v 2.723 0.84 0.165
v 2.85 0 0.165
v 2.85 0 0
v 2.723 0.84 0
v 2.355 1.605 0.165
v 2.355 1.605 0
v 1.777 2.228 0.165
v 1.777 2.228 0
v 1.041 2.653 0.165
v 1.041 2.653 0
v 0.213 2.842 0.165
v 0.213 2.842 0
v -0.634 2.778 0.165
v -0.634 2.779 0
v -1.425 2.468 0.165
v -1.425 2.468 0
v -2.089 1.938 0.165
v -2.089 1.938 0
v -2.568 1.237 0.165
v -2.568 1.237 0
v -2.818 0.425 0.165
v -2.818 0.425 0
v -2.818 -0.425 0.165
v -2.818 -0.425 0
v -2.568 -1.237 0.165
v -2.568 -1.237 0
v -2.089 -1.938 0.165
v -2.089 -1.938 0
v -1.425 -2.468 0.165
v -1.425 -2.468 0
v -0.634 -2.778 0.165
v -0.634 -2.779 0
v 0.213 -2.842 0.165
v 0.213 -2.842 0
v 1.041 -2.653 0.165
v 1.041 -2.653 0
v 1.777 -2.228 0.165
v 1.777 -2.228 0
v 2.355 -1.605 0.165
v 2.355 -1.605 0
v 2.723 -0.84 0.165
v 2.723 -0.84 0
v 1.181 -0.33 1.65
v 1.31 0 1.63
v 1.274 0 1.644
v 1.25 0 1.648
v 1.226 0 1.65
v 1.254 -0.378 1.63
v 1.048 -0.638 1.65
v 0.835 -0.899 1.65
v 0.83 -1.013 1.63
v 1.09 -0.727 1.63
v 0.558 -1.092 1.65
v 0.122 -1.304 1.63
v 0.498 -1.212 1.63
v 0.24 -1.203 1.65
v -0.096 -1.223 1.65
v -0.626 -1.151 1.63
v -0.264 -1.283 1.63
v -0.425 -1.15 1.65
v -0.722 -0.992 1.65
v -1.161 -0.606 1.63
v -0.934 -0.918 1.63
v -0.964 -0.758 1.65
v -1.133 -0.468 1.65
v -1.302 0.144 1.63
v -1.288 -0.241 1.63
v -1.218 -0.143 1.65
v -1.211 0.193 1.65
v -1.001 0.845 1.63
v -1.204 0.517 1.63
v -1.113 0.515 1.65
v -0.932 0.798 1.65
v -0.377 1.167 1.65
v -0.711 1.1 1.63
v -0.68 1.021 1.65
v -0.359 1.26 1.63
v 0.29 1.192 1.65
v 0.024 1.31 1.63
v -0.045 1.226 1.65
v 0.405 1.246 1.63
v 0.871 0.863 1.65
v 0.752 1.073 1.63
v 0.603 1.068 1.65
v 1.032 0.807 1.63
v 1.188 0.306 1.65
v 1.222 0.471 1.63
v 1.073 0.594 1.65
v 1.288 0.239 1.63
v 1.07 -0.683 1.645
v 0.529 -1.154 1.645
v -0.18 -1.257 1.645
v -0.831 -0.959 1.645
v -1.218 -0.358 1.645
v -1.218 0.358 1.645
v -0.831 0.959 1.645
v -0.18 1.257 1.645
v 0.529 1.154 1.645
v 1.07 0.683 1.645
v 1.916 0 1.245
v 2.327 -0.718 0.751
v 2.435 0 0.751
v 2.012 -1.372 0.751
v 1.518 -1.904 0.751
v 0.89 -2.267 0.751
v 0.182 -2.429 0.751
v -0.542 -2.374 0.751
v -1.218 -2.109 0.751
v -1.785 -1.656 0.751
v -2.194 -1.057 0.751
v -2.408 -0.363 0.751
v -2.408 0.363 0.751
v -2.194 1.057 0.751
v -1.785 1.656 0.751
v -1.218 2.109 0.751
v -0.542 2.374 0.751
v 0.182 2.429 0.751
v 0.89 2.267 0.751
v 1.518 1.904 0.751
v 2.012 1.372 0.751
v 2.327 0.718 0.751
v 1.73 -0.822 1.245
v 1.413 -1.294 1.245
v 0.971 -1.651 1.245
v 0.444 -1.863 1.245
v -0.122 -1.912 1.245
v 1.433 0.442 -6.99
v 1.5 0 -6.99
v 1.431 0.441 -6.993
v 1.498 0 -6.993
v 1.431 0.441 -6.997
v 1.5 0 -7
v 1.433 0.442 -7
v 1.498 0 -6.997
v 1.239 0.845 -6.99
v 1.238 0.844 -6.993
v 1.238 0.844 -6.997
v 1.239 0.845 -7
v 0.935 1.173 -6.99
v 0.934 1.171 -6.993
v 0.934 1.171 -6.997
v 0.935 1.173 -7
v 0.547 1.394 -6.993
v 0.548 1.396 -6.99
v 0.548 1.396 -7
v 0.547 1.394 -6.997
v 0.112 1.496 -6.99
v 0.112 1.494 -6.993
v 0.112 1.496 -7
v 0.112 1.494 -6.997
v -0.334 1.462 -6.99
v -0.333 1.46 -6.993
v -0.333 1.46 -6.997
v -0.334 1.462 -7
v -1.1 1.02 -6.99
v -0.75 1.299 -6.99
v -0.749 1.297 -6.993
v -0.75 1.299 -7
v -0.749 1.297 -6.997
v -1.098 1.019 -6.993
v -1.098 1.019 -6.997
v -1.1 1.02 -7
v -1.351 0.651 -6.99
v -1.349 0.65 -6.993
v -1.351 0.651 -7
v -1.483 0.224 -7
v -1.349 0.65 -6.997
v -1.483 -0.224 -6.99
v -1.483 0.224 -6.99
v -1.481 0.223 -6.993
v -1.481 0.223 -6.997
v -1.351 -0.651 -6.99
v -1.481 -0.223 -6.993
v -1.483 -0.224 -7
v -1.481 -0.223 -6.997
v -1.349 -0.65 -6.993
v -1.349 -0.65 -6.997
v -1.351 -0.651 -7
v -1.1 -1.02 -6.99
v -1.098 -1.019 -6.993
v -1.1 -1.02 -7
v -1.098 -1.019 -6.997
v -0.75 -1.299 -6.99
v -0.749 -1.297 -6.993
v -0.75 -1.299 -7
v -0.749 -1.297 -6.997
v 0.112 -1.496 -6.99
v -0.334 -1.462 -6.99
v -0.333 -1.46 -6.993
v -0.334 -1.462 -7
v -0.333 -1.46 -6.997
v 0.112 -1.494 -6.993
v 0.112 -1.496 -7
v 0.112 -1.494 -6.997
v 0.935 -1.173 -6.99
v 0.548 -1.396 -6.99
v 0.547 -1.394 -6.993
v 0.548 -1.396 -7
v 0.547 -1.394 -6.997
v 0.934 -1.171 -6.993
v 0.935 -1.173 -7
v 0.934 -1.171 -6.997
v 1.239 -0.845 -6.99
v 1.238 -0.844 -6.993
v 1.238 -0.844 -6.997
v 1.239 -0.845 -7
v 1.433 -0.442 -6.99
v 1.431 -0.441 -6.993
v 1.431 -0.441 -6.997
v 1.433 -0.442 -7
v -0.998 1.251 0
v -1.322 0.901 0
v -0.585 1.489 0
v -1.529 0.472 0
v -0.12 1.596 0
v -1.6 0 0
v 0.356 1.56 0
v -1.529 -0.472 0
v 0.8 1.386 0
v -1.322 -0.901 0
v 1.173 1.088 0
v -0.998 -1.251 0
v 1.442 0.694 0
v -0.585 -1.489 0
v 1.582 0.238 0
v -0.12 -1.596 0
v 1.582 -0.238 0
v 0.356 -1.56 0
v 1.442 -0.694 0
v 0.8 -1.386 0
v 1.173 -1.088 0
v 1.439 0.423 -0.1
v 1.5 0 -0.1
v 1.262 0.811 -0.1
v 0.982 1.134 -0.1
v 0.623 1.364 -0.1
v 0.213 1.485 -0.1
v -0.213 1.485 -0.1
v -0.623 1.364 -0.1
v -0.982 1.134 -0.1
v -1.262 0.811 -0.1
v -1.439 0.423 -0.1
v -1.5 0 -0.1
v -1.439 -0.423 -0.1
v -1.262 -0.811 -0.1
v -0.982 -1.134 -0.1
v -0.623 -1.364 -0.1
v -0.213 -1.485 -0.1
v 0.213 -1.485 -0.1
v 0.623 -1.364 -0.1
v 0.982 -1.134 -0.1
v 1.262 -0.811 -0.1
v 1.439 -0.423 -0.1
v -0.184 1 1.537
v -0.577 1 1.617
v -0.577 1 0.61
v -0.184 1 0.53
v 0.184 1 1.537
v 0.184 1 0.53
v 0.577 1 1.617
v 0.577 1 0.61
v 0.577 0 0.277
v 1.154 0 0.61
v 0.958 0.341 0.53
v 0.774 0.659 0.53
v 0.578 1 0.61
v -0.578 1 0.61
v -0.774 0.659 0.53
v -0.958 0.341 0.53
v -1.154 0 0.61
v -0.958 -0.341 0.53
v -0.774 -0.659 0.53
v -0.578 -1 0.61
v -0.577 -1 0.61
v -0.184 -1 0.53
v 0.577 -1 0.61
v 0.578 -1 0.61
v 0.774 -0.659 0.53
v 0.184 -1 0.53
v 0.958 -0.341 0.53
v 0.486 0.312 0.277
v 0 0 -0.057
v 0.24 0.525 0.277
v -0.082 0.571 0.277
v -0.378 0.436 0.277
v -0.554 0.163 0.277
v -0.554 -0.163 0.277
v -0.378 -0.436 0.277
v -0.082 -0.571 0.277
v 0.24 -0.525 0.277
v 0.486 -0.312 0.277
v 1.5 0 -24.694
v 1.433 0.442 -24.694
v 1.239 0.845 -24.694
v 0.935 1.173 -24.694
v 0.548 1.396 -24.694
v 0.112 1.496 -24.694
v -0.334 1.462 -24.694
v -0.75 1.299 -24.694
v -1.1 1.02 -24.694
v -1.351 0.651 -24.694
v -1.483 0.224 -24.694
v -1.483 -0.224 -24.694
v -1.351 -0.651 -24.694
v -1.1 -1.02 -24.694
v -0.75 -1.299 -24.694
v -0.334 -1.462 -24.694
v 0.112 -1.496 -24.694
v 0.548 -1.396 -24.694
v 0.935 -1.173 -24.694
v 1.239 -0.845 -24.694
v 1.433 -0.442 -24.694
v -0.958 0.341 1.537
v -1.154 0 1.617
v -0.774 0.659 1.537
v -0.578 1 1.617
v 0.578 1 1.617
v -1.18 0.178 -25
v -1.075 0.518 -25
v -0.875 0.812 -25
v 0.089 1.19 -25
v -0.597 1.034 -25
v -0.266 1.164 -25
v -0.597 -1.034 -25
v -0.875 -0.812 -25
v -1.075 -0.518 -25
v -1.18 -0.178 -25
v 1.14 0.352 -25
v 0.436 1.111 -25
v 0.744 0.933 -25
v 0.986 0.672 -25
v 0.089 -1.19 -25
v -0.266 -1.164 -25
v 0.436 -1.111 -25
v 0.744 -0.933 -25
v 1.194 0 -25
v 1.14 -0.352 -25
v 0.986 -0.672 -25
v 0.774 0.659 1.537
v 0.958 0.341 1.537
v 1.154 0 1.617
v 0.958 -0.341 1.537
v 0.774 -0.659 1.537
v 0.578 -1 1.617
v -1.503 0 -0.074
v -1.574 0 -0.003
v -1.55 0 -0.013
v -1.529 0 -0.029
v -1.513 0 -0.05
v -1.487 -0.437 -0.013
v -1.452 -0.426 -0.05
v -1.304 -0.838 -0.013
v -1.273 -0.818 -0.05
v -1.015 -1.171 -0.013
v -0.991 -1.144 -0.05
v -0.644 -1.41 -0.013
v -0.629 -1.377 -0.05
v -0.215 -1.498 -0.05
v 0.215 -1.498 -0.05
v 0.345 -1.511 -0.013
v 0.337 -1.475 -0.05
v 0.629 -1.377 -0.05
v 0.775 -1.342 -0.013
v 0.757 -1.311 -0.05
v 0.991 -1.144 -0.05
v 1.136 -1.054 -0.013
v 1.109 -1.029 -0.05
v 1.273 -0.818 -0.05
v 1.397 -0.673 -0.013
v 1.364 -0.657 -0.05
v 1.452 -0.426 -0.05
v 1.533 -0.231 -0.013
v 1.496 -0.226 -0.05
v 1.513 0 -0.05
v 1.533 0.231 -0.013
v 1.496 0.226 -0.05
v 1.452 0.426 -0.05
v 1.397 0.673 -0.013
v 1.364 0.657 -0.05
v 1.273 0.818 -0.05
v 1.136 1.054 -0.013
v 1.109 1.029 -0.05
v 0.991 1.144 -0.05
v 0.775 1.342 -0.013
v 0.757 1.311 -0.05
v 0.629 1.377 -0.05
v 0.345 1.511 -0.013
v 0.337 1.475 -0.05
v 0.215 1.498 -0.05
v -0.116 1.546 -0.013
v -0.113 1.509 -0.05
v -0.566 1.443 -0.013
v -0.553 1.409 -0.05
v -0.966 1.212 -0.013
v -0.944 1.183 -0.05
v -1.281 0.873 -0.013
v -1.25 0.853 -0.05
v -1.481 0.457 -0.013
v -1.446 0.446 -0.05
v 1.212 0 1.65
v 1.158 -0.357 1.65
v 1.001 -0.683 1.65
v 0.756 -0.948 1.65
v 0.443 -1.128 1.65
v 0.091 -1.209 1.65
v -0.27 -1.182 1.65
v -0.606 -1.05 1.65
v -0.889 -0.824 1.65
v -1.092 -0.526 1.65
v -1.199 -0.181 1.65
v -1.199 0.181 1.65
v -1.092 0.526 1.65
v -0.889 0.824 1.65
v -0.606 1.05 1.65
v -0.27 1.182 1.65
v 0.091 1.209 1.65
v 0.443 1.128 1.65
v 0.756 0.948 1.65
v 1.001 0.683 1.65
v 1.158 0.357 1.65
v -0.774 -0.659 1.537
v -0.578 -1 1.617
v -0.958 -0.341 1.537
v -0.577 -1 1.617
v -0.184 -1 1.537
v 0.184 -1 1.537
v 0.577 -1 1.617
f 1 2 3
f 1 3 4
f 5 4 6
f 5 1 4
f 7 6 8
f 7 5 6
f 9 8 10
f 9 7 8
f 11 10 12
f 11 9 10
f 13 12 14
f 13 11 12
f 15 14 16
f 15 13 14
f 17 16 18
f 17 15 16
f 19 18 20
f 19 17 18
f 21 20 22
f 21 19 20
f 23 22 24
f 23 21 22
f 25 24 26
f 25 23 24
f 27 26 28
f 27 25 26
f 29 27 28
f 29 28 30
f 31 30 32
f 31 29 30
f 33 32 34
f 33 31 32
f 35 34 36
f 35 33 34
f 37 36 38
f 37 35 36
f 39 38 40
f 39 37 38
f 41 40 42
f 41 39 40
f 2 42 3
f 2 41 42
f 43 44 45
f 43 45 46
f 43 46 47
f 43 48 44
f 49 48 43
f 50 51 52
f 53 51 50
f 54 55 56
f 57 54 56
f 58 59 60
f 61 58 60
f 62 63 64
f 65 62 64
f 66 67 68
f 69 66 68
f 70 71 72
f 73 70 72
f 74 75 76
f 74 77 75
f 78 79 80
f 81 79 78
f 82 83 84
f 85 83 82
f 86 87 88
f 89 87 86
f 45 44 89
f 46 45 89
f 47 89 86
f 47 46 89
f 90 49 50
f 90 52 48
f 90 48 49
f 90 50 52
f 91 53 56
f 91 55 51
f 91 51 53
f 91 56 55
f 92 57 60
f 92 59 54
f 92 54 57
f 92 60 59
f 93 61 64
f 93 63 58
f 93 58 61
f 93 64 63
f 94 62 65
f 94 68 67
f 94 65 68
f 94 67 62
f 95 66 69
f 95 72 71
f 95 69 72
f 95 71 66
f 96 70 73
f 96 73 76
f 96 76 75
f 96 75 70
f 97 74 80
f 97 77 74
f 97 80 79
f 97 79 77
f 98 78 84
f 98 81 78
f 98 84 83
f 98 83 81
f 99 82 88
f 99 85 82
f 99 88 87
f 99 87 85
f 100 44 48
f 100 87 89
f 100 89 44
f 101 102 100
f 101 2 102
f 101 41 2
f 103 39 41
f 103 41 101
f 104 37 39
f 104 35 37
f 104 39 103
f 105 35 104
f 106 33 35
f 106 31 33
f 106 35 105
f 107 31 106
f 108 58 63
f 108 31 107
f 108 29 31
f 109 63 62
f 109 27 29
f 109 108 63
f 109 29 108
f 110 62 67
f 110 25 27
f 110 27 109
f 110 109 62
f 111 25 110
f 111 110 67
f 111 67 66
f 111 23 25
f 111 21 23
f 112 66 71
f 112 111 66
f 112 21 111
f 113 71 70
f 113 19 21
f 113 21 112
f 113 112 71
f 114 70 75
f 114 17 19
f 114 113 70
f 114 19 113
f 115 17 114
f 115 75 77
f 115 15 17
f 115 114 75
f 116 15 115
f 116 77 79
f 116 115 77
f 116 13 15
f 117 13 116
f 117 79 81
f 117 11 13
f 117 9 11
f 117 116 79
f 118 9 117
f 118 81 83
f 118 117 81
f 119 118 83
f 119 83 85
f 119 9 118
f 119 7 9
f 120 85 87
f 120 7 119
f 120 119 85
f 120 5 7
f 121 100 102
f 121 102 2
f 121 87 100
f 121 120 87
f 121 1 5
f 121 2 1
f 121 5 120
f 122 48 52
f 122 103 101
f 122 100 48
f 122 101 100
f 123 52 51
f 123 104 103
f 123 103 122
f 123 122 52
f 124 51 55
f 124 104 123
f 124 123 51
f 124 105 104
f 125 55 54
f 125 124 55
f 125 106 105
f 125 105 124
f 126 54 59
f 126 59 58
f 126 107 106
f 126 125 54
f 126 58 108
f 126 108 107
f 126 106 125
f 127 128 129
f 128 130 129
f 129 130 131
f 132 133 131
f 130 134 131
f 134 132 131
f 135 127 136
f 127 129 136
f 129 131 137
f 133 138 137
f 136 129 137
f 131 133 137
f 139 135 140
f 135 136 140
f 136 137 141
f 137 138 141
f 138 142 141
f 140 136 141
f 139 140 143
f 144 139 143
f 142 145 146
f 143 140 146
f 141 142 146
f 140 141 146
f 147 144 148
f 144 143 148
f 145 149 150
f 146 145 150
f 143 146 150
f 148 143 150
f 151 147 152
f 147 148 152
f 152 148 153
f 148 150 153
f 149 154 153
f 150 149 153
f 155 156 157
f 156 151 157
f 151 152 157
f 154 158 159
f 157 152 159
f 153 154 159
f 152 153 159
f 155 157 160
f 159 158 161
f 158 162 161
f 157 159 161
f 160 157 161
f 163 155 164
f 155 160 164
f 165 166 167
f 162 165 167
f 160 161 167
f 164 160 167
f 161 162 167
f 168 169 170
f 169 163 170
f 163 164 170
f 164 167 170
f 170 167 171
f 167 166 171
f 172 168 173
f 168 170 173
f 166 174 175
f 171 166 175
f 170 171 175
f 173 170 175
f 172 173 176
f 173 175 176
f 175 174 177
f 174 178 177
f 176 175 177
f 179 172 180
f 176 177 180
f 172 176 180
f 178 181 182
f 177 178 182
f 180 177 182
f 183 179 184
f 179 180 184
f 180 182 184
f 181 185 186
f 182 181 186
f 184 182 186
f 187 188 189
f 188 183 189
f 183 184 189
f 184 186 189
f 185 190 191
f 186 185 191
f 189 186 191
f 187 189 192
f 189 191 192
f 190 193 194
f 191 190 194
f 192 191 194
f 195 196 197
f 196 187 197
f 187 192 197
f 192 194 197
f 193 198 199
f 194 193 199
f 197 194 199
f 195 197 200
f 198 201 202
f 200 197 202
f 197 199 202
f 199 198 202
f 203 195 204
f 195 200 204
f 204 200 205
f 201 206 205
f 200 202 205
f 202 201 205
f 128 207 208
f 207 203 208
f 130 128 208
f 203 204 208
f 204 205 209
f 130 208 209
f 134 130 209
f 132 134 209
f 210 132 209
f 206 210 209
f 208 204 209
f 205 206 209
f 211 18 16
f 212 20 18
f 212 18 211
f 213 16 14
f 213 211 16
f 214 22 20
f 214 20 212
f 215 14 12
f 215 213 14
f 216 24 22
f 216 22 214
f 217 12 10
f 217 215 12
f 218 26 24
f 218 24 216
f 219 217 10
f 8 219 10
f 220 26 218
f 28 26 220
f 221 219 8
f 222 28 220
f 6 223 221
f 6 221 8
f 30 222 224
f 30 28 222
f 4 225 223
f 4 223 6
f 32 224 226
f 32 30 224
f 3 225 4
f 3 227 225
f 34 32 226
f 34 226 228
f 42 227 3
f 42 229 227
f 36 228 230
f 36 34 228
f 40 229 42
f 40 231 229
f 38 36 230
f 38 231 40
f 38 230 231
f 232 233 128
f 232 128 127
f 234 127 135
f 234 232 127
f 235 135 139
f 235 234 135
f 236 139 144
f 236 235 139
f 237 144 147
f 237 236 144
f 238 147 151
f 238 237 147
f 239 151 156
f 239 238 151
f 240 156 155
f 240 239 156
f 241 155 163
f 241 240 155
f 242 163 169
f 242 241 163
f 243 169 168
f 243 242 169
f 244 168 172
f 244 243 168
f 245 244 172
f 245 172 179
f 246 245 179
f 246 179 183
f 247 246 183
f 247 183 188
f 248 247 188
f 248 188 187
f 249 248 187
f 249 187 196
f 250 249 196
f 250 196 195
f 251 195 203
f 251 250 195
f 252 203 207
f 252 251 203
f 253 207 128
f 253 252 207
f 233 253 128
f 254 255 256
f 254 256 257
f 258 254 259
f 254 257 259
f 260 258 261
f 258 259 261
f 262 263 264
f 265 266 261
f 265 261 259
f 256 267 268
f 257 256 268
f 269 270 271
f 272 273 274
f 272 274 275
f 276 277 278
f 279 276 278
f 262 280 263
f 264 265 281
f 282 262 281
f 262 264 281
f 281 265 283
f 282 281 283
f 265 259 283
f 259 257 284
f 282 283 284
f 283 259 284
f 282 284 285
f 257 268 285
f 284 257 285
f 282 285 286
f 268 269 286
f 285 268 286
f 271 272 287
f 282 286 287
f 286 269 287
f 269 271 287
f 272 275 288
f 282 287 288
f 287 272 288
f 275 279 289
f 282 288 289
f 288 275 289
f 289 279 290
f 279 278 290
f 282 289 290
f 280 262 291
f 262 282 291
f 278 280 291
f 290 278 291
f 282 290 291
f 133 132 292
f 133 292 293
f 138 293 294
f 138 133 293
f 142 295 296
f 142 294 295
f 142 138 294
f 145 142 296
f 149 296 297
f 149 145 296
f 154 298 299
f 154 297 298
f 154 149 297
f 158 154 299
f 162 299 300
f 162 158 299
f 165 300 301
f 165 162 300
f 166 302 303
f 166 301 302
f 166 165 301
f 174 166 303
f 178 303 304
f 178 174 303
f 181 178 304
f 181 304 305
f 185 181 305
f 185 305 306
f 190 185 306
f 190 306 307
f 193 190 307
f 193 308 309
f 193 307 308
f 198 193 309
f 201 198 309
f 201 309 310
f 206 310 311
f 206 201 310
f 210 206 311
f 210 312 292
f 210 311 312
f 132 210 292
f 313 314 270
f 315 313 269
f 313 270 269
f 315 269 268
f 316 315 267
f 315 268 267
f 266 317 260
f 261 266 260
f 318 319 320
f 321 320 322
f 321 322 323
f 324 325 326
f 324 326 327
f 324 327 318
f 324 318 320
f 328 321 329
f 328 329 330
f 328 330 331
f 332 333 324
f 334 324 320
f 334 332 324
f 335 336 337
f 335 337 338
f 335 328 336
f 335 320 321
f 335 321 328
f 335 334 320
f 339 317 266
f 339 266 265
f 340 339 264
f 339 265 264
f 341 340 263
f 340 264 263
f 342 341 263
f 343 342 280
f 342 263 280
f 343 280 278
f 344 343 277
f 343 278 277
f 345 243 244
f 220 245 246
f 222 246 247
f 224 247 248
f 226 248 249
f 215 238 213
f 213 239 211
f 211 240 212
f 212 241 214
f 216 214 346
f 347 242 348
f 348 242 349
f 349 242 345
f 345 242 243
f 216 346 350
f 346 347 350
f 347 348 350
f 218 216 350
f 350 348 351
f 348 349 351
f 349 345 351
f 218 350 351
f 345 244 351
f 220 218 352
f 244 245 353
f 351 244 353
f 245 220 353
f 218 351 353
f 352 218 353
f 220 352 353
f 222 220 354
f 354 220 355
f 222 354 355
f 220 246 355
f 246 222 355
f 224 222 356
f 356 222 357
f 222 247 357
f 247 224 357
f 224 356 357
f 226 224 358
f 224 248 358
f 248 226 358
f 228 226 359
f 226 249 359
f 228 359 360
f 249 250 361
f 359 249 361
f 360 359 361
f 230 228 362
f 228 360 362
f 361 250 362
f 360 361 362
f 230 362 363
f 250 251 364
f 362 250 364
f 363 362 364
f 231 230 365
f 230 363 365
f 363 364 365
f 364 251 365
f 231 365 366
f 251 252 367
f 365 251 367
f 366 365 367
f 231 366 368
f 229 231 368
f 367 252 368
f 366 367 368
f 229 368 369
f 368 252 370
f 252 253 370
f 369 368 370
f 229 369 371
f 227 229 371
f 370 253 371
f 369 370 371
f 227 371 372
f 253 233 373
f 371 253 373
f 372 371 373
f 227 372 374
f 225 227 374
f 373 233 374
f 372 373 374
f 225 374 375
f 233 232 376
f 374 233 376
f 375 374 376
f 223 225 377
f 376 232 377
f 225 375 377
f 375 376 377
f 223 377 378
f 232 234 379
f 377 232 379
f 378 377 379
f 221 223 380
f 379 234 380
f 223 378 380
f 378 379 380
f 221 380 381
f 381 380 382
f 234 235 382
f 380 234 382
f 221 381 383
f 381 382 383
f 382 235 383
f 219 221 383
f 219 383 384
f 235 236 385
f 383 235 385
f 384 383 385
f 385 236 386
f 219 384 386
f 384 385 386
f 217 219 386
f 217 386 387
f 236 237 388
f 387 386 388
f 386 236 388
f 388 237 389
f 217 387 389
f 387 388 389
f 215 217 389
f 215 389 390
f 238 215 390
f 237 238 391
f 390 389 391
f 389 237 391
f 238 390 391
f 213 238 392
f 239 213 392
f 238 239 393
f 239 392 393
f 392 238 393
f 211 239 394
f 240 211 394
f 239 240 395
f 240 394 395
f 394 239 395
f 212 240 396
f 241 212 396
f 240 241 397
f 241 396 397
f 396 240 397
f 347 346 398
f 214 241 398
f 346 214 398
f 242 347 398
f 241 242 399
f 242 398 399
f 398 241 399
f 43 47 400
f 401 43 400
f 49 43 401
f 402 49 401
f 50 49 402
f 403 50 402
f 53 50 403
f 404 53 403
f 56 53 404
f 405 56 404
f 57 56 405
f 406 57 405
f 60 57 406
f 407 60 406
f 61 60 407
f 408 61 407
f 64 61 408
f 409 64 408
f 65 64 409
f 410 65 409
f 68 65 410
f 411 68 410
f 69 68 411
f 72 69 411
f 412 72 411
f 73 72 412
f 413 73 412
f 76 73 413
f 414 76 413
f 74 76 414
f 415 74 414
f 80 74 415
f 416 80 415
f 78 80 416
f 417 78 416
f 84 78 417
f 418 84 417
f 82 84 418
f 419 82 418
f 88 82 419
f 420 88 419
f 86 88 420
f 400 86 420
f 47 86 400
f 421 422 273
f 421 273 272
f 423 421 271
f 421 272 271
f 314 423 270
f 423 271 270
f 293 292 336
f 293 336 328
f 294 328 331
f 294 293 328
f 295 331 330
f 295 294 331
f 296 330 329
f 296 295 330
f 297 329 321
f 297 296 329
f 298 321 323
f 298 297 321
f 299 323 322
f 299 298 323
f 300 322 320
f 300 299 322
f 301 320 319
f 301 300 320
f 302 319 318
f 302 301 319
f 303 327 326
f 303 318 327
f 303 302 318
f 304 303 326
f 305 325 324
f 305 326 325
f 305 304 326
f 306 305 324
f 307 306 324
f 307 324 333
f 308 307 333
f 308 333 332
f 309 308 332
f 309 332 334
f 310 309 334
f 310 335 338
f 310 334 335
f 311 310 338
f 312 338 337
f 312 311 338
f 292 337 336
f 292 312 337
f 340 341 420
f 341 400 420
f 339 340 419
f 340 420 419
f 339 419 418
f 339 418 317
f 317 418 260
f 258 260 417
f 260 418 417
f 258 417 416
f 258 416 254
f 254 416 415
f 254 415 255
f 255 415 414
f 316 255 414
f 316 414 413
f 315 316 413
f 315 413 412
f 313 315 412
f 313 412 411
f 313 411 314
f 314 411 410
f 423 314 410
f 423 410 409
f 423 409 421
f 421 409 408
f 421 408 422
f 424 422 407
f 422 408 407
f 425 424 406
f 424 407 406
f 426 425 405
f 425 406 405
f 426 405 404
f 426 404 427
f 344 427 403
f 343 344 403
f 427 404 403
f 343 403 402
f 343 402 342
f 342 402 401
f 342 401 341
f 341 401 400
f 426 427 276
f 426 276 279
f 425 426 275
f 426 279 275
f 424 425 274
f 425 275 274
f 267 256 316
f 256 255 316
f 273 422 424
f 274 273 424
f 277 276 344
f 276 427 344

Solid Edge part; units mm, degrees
sketch "Sketch1" plane through (0, 0, 0) normal (0, -1, 0) x (1, 0, 0)
  line L0 (0, -25) -> (1.5, -25)
  line L1 (1.5, -25) -> (1.5, -7)
  arc A0 (1.5, -6.99) -> (1.5, -7) centre (1.5038, -6.995) ccw
  line L2 (1.5, -6.99) -> (1.5, 0)
  line L3 (1.5, 0) -> (2.85, 0)
  line L4 (2.85, 0) -> (2.85, 0.165)
  arc A1 (1.27, 1.65) -> (2.85, 0.165) centre (-0.3628, -1.6703) cw
  line L5 (0, 1.65) -> (1.27, 1.65)
  dimension "D1" = 18
  dimension "D2" = 1.5
  dimension "D3" = 1.27
  dimension "D4" = 2.85
  dimension "D5" = 0.165
  dimension "D6" = 1.65
  dimension "D7" = 3.7
  dimension "D8" = 25
  dimension "D9" = 0.01
  dimension "D10" = 0.0025
revolve "RevolvedProtrusion1" add sketch "Sketch1" angle 360 about axis through (0, 0, 5) along (0, 0, -1)
sketch "Sketch2" plane through (0, 0, 0) normal (0, -1, 0) x (1, 0, 0)
  line L0 (0, -0.0566) -> (1.1545, 0.61)
  line L1 (1.1545, 0.61) -> (1.1545, 1.65)
  line L2 (1.1545, 1.65) -> (0, 1.65)
  dimension "D1" = 1.1545
  dimension "D2" = 1.04
revolve "RevolvedCutout1" cut sketch "Sketch2" angle 360 about axis through (0, 0, 5.3) along (0, 0, -1)
sketch "Sketch3" plane through (0, 0, 0) normal (0, 0, -1) x (0, 1, 0)
  arc A0 (-1, 0.577) -> (-1, -0.577) centre (0, 0) ccw
  line L0 (-1, 0.577) -> (-1, -0.577)
  dimension "D1" = 1
extrude "Protrusion1" add sketch "Sketch3" against normal blind 1.65
pattern_circular "Pattern1" count 6 over 360 about axis through (0, 0, 0) along (0, 0, -1) of "Protrusion1"
fillet "Round_1" radius 0.185 1 edges at (-1.27, 0, 1.65)
sketch "Sketch4" plane through (0, 0, 0) normal (0, -1, 0) x (1, 0, 0)
  line L0 (0, 0.9501) -> (1.2122, 1.65)
  line L1 (1.2122, 1.65) -> (0, 1.65)
  dimension "D1" = 1.2122
revolve "RevolvedCutout2" cut sketch "Sketch4" angle 360 about axis through (0, 0, 5.3) along (0, 0, -1)
sketch "Sketch5" plane through (0, 0, 0) normal (0, -1, 0) x (1, 0, 0)
  line L0 (-1.5, 0) -> (-1.5, -0.1)
  line L1 (-1.6, 0) -> (-1.5, 0)
  arc A0 (-1.6, 0) -> (-1.5, -0.1) centre (-1.6, -0.1) cw
  dimension "D1" = 1.5
  dimension "D2" = 0.1
revolve "RevolvedProtrusion2" add sketch "Sketch5" angle 360 about axis through (0, 0, -0.5) along (0, 0, 1)
cosmetic_thread "Thread1" size "M3"
chamfer "Chamfer1" distance 0.3065 angle 45 1 edges at (-1.5, 0, -25)
properties material "Stahl"
